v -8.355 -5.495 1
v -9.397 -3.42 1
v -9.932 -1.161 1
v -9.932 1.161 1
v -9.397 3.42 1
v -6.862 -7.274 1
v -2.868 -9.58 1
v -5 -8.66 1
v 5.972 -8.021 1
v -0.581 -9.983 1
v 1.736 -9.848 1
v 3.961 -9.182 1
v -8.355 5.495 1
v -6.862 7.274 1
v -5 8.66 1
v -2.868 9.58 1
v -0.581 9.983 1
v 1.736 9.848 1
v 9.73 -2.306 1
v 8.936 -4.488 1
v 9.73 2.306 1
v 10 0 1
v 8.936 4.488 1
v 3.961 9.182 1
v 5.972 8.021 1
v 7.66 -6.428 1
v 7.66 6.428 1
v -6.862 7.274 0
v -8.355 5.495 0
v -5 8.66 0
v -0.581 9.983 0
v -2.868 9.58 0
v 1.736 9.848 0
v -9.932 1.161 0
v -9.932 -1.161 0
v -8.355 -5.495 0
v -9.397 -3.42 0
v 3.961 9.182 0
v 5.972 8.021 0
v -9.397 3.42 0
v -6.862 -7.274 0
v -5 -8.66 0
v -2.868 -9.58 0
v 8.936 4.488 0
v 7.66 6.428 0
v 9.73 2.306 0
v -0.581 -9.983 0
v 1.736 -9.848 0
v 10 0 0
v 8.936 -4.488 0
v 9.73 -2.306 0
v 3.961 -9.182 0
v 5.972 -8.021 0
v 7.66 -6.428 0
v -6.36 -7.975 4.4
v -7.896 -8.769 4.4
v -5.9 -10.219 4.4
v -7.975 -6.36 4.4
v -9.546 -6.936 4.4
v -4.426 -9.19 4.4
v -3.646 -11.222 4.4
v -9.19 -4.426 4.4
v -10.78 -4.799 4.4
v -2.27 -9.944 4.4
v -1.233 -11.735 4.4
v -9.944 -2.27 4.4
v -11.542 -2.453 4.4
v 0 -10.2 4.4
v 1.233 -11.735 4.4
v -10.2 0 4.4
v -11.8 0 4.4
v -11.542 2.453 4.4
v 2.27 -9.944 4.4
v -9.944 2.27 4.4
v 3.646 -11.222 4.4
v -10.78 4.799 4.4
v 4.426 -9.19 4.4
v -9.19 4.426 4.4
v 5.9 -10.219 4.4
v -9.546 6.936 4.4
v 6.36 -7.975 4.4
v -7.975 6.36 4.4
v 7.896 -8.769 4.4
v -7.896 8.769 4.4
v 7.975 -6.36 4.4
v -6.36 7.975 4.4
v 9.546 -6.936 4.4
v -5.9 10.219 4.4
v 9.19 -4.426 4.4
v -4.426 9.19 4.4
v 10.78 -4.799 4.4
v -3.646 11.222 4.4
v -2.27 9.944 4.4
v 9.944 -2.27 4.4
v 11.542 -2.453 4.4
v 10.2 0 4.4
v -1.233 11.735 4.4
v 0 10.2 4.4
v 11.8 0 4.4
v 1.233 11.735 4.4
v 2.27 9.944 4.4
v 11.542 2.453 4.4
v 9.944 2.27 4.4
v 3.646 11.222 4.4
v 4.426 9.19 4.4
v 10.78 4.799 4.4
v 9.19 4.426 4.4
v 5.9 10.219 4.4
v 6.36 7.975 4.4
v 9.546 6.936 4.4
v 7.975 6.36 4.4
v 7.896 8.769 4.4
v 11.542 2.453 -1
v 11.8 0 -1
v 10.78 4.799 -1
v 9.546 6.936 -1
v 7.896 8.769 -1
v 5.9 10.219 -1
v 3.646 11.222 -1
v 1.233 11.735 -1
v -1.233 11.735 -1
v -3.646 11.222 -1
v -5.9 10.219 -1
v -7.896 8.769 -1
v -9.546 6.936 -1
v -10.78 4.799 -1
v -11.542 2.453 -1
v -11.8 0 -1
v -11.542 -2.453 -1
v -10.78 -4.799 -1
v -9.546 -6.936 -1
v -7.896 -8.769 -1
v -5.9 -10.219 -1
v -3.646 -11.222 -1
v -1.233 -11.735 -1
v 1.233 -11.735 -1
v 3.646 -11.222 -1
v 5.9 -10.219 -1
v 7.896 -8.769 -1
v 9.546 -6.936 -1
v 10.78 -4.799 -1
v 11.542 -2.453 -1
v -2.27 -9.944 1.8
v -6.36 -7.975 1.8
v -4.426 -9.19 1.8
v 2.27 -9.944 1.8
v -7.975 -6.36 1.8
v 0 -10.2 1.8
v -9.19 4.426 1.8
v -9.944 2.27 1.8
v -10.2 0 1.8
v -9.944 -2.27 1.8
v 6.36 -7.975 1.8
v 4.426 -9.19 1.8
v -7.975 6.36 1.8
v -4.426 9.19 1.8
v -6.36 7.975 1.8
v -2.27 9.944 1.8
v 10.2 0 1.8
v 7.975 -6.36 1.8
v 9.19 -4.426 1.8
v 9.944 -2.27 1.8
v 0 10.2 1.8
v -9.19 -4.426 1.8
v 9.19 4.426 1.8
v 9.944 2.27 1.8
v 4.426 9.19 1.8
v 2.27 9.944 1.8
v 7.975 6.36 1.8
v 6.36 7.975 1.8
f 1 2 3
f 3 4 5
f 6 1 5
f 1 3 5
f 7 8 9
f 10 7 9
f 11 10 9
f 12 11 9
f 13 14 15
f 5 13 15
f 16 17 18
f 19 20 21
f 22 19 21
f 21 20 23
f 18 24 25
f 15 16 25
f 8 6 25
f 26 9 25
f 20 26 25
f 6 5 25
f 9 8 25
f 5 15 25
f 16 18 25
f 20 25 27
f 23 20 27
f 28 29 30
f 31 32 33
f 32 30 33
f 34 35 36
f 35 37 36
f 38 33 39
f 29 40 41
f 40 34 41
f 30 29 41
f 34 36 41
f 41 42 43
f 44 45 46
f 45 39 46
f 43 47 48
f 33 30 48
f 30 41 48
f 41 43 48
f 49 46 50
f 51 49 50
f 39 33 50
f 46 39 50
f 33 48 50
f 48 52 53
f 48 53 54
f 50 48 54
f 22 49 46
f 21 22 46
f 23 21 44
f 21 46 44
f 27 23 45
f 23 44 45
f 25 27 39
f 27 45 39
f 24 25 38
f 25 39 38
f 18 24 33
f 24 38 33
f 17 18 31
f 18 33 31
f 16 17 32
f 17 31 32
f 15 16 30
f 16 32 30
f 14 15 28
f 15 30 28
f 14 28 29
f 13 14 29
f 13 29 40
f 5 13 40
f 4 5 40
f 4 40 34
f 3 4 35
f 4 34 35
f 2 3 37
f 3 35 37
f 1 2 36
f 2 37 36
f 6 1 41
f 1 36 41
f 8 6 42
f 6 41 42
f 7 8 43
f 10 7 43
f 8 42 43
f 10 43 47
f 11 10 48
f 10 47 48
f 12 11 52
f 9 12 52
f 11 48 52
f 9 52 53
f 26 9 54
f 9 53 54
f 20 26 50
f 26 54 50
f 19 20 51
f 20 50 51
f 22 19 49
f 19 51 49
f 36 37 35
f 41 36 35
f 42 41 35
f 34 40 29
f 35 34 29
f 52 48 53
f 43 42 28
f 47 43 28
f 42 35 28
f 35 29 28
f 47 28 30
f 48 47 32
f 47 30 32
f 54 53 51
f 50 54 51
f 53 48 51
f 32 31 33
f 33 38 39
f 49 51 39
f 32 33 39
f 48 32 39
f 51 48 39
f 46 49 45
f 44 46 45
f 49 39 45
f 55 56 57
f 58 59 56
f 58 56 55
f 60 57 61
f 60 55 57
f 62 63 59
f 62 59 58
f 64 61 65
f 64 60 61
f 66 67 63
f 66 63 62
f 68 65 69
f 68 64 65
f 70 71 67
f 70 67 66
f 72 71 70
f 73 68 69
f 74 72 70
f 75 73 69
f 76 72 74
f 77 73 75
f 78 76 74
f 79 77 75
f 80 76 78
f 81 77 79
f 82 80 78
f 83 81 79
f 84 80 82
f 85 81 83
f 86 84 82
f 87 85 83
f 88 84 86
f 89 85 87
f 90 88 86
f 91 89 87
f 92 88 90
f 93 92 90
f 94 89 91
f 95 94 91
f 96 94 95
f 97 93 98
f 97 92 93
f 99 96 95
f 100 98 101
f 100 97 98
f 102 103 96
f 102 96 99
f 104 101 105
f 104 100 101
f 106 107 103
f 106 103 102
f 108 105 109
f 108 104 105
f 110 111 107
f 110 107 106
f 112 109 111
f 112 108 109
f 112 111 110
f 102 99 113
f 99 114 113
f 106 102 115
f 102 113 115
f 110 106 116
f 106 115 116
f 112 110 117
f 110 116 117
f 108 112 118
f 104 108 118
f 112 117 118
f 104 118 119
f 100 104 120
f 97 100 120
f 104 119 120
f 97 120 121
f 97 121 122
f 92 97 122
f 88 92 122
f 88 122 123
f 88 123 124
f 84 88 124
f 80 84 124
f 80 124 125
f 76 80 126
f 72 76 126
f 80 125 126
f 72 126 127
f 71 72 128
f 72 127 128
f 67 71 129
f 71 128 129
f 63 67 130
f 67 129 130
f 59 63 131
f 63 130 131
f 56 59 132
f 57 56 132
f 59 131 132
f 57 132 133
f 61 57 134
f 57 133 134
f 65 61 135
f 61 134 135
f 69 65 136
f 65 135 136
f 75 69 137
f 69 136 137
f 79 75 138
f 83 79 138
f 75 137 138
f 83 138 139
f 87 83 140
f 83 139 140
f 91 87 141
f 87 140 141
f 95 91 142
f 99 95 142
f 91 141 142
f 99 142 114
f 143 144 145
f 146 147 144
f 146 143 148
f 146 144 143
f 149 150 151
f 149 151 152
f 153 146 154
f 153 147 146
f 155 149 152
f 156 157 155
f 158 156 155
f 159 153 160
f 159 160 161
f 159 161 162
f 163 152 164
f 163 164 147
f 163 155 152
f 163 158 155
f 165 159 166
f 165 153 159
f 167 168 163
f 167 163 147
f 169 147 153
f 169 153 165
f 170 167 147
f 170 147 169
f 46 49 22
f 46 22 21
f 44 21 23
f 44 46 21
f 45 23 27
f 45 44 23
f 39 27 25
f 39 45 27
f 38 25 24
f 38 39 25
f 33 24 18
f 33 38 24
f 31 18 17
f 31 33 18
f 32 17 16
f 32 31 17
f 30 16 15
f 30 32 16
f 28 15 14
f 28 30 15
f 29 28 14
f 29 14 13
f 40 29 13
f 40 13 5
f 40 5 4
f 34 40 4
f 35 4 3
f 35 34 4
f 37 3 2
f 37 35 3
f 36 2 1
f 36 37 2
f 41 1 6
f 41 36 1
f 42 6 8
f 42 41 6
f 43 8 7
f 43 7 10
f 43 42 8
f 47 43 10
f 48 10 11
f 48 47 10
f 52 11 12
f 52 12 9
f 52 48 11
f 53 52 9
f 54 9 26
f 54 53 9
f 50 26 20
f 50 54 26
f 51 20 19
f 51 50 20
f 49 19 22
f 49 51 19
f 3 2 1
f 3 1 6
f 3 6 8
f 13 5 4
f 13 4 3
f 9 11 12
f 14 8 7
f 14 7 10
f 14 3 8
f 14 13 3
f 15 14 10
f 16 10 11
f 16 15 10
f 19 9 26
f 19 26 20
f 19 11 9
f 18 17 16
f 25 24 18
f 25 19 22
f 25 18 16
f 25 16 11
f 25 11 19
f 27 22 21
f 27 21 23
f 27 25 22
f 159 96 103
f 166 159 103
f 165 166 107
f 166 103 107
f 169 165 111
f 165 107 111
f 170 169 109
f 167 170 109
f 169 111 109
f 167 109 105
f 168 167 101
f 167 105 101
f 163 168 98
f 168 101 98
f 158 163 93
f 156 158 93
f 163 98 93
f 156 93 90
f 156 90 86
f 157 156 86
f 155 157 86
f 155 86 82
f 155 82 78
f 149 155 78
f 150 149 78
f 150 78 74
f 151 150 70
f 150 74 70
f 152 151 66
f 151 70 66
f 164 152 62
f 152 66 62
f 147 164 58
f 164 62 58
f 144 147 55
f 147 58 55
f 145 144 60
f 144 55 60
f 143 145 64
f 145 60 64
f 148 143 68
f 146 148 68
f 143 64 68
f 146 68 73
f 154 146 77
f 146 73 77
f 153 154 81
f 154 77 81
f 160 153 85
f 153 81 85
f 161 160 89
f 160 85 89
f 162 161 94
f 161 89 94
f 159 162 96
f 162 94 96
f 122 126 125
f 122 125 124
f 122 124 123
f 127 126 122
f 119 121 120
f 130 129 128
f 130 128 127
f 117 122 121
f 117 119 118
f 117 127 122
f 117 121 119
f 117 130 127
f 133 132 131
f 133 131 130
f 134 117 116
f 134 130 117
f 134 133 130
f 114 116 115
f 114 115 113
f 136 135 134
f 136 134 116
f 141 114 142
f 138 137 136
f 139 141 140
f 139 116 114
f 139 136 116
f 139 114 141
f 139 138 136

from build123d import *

# Parameters (mm, degrees)
F0_R     = 10
F1_DEPTH = 1
F2_R     = 11.8
F3_DEPTH = 1
F4_R     = 11.8
F4_R_2   = 10
F5_DEPTH = 1
F6_R     = 11.8
F7_DEPTH = 3.4
F8_R     = 10.2
F9_DEPTH = 2.6


with BuildPart() as f1:
    # F0 (on Top) → F1 (new body)
    with BuildSketch(Plane.XY):
        Circle(F0_R)
    extrude(amount=F1_DEPTH)


with BuildPart() as f3:
    # F2 (on face) → F3 (new body)
    with BuildSketch(Plane(origin=(0, 0, 0), x_dir=(1, 0, 0), z_dir=(0, 0, -1))):
        Circle(F2_R)
    extrude(amount=F3_DEPTH)

    # F4 (on face) → F5 (join)
    with BuildSketch(Plane.XY):
        Circle(F4_R)
        Circle(F4_R_2, mode=Mode.SUBTRACT)
    extrude(amount=F5_DEPTH)

    # F6 (on face) → F7 (join)
    with BuildSketch(Plane.XY.offset(1)):
        Circle(F6_R)
    extrude(amount=F7_DEPTH)

    # F8 (on face) → F9 (cut)
    with BuildSketch(Plane.XY.offset(4.4)):
        Circle(F8_R)
    extrude(amount=-F9_DEPTH, mode=Mode.SUBTRACT)


solid = Compound([f1.part, f3.part])
